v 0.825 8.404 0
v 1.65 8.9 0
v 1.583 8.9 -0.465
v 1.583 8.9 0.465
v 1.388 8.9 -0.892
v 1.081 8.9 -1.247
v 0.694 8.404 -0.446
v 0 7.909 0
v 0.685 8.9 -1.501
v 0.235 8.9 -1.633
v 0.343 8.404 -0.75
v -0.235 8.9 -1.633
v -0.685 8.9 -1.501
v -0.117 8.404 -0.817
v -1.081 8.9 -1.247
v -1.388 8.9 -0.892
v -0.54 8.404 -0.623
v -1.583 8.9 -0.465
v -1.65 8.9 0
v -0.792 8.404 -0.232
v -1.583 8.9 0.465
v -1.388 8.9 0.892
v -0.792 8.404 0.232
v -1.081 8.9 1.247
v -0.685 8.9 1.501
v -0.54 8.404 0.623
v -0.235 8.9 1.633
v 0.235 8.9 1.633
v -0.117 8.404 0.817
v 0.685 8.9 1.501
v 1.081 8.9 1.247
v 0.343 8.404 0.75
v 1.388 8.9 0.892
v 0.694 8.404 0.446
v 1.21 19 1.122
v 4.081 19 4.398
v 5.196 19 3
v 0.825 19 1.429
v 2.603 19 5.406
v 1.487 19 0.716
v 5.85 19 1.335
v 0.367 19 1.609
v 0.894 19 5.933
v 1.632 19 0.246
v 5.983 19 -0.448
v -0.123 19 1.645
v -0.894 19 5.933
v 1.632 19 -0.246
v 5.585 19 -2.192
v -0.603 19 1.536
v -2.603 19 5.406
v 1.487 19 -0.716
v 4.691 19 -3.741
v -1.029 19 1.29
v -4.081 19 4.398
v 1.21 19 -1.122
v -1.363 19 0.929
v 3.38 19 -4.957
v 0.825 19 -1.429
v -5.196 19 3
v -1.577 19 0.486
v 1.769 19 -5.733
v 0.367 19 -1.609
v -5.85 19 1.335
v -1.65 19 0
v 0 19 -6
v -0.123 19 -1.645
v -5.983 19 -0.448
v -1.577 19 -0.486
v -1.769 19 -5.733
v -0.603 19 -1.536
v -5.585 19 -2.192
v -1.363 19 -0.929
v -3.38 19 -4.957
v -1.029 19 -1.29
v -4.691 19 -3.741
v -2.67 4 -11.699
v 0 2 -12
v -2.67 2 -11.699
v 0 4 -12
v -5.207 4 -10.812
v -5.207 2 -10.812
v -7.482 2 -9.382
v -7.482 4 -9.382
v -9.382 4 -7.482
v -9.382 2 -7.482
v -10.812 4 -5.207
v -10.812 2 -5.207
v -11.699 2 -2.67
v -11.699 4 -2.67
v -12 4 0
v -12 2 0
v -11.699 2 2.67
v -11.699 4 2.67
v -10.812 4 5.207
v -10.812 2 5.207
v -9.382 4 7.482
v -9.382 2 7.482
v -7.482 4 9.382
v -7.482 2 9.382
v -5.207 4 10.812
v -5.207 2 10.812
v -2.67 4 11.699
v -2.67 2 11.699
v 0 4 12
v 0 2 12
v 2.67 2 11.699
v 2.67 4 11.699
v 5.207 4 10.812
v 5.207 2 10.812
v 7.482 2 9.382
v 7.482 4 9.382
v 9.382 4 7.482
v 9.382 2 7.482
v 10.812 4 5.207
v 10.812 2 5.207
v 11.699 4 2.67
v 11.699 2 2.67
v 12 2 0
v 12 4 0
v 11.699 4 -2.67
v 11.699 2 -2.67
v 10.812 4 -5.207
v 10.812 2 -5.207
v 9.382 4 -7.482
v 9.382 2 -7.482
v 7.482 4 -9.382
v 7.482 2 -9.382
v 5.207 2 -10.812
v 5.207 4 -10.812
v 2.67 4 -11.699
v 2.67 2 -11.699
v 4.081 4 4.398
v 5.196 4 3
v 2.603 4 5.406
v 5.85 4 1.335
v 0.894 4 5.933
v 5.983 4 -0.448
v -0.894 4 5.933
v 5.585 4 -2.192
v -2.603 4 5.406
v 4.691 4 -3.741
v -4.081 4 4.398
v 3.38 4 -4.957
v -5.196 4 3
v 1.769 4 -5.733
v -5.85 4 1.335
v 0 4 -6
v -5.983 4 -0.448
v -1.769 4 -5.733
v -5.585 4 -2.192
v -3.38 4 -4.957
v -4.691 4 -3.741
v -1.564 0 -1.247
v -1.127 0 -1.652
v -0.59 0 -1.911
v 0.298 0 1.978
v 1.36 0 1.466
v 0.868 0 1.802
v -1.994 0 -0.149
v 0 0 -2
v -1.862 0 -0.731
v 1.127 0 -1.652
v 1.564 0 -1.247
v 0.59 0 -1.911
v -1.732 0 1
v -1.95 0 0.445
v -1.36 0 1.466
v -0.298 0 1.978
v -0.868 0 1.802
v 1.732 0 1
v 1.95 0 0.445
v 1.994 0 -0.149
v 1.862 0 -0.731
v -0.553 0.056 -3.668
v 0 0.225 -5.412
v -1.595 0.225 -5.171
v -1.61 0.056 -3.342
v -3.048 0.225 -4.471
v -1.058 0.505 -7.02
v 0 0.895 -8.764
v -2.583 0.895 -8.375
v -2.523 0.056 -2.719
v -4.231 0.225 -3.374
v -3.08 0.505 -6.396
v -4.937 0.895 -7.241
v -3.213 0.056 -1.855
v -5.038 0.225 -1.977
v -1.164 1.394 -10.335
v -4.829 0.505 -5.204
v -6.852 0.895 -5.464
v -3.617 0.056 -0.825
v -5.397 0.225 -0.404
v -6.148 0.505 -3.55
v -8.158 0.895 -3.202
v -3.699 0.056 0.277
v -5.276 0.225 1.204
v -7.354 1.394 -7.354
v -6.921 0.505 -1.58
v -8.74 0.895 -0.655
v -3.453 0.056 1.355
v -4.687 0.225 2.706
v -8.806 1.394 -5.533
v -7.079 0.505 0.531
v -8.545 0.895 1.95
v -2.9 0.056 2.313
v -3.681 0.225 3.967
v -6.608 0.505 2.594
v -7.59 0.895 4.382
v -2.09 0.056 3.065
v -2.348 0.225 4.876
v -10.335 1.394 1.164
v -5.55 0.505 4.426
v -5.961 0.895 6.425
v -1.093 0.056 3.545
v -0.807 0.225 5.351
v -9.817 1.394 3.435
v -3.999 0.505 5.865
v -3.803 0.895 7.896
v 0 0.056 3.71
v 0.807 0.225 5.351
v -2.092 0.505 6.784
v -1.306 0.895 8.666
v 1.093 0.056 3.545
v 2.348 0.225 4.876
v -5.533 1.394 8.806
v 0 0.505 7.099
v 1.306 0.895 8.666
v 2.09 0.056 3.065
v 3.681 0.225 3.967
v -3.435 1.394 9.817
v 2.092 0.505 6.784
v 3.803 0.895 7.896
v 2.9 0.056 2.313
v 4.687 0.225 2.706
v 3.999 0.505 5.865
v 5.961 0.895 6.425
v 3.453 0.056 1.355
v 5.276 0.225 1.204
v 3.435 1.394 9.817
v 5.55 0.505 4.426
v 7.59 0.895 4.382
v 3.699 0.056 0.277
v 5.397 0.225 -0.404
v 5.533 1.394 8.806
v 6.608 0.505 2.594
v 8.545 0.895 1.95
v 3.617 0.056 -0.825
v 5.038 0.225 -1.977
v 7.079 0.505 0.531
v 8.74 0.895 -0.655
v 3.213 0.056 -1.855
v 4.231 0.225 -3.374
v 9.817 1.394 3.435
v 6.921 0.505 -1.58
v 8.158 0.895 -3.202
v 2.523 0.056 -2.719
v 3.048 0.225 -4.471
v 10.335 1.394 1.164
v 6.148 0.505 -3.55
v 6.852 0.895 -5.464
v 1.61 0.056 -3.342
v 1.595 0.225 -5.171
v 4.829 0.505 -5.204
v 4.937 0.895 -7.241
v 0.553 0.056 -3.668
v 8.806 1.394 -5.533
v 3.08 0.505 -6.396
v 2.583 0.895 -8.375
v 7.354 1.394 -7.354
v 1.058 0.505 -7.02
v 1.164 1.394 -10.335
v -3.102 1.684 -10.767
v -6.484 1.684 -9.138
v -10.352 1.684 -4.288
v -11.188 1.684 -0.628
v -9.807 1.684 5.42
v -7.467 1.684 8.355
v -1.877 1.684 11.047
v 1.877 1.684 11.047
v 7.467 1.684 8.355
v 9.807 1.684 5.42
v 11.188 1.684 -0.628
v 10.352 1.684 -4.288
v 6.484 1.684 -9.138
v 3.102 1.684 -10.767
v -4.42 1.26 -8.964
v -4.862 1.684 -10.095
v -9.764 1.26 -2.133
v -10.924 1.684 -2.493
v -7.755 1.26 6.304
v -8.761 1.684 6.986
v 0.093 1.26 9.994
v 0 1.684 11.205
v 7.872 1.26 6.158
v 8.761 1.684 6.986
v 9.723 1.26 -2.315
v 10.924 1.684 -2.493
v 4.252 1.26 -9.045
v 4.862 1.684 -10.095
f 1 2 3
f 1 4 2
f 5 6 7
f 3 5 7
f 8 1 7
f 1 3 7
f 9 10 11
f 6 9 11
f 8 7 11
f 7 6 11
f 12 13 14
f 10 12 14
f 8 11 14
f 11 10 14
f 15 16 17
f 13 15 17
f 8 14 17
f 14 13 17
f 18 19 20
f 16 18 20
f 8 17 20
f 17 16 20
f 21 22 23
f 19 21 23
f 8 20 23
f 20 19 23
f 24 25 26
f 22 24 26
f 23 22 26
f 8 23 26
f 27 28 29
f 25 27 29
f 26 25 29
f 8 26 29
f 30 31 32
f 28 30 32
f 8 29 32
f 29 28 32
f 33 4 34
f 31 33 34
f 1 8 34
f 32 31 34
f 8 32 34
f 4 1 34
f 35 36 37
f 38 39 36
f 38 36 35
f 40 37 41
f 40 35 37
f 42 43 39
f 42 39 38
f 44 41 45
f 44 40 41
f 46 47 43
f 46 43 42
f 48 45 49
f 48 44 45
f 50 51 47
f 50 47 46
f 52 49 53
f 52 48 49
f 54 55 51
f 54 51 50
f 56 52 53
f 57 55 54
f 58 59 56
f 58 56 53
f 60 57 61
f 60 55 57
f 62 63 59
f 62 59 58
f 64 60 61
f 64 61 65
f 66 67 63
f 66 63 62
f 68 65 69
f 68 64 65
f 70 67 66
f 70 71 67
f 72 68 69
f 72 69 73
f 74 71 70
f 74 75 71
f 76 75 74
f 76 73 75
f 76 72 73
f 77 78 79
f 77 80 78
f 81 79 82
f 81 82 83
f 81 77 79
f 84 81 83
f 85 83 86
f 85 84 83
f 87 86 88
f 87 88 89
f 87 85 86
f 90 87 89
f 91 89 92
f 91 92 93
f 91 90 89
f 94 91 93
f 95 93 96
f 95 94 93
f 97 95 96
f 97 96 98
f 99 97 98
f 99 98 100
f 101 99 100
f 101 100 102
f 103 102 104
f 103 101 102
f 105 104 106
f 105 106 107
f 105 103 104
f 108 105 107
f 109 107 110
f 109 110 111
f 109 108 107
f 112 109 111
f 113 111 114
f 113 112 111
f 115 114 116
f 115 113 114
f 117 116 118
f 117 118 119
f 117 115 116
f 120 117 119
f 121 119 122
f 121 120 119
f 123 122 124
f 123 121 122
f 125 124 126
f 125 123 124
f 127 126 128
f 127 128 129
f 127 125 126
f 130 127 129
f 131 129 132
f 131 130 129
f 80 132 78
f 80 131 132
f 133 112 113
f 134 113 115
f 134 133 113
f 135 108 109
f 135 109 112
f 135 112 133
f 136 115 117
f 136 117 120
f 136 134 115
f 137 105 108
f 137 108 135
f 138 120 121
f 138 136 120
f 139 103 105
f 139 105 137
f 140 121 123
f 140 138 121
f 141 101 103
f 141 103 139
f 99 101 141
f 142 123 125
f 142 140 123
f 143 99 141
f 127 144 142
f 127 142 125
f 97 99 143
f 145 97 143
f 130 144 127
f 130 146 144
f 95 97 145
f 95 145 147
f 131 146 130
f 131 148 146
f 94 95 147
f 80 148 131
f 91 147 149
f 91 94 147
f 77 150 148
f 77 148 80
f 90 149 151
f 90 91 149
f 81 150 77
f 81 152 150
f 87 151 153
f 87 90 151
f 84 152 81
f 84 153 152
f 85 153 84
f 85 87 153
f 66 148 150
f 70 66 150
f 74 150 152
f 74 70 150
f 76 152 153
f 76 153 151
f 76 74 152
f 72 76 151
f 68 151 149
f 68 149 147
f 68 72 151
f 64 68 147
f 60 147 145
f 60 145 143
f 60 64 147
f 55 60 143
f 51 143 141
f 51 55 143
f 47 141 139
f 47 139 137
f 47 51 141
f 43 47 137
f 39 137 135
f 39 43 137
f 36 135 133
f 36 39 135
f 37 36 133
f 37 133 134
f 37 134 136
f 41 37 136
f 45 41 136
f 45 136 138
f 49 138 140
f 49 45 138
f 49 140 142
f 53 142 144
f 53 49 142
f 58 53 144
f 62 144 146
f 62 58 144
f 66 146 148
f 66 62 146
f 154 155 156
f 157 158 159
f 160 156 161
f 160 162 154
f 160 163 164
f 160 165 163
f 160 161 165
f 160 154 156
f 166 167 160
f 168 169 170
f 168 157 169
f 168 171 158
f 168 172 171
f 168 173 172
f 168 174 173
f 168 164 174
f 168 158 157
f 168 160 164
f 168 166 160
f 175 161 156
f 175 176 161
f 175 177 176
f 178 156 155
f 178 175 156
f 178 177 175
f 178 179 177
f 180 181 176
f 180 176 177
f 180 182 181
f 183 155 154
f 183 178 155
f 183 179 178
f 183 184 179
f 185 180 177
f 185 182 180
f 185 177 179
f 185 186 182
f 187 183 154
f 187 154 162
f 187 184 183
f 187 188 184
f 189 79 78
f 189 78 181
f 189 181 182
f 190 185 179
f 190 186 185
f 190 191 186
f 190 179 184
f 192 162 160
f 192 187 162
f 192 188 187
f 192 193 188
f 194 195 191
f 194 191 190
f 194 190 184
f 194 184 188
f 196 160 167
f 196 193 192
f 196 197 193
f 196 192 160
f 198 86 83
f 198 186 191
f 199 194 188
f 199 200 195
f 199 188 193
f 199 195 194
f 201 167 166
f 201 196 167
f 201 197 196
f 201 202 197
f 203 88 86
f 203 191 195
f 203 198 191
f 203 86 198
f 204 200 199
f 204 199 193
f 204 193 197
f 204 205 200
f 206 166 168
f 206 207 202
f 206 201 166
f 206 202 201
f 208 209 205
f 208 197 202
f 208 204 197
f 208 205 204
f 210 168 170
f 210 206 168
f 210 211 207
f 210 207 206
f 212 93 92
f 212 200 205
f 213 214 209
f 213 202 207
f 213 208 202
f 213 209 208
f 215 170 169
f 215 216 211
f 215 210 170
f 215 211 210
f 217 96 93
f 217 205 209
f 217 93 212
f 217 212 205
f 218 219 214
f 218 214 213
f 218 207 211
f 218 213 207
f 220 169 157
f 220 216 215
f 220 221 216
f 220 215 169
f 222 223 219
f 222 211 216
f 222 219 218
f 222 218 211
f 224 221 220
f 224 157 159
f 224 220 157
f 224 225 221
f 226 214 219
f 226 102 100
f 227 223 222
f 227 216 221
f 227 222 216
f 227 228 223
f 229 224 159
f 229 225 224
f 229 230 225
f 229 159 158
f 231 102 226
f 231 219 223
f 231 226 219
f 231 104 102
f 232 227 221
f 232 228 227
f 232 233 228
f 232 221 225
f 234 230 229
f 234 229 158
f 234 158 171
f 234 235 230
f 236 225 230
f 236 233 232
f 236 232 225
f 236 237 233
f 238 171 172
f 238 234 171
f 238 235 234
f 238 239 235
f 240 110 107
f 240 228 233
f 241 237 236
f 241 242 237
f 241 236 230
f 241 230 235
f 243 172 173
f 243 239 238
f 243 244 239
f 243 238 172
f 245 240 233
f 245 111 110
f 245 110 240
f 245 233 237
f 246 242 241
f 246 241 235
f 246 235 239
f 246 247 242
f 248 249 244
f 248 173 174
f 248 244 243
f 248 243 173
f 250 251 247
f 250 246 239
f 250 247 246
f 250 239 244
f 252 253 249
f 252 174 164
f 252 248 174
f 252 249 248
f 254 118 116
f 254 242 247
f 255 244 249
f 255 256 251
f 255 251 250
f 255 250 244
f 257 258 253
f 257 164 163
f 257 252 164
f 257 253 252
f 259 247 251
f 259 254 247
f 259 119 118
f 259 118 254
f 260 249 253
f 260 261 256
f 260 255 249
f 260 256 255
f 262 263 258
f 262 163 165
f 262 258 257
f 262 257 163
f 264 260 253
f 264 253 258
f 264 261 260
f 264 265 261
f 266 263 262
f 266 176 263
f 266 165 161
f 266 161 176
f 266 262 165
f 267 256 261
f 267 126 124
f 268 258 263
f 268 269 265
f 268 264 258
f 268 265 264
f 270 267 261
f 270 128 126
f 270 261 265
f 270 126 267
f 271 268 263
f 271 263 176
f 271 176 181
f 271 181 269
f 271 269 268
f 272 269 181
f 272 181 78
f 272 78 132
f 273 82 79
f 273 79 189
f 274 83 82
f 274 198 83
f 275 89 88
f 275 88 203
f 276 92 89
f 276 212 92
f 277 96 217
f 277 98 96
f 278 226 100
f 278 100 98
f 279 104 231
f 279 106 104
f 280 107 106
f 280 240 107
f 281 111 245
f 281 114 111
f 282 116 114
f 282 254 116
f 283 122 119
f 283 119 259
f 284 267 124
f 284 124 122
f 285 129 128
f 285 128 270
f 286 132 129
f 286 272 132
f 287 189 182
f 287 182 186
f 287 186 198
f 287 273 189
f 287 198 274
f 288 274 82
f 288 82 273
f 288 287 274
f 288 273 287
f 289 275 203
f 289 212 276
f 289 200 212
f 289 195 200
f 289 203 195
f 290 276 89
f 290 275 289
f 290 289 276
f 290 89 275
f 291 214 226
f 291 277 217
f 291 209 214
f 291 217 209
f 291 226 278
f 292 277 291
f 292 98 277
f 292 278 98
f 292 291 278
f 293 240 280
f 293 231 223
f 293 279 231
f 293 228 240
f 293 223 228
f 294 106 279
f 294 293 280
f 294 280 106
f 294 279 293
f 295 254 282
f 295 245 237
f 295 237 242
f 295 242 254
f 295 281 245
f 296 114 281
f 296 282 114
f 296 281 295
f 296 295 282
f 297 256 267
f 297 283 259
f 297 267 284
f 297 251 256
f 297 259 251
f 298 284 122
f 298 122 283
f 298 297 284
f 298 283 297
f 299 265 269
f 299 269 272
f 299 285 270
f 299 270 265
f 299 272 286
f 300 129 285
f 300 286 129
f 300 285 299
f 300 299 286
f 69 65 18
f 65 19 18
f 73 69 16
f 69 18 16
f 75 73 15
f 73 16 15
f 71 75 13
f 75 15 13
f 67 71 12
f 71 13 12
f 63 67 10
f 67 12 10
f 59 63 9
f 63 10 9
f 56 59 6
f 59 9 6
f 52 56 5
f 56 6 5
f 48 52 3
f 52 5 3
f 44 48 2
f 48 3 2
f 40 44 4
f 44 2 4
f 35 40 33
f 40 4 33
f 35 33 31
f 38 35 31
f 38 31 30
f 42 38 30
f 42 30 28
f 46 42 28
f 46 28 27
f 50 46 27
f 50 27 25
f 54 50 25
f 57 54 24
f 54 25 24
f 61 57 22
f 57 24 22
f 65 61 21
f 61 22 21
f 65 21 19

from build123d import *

# Parameters (mm, degrees)
M4X0_7_TAPPED_HOLE1_D     = 3.3
M4X0_7_TAPPED_HOLE1_DEPTH = 10.1
M4X0_7_TAPPED_HOLE1_TIP   = 0.991420021


with BuildPart() as part:
    # Sketch1 → Revolve1 (revolve)
    with BuildSketch(Plane.XY):
        with BuildLine():
            Line((0, 0), (-2, 0))
            ThreePointArc((-2, 0), (-7.099019514, 0.504902432), (-12, 2))
            Line((-12, 2), (-12, 4))
            Line((-12, 4), (-6, 4))
            Line((-6, 4), (-6, 19))
            Line((-6, 19), (0, 19))
            Line((0, 19), (0, 0))
        make_face()
    revolve(axis=Axis((0, -1.785426229, 0), (0, 1, 0)))

    # M4x0.7 Tapped Hole1
    with Locations(Plane(origin=(0, 19, 0), x_dir=(1, 0, 0), z_dir=(0, 1, 0))):
        with Locations((0, 0)):
            Hole(M4X0_7_TAPPED_HOLE1_D / 2, depth=M4X0_7_TAPPED_HOLE1_DEPTH)
            with Locations((0, 0, -(M4X0_7_TAPPED_HOLE1_DEPTH + M4X0_7_TAPPED_HOLE1_TIP / 2))):  # 118° drill point
                Cone(0, M4X0_7_TAPPED_HOLE1_D / 2, M4X0_7_TAPPED_HOLE1_TIP, mode=Mode.SUBTRACT)


solid = part.part
